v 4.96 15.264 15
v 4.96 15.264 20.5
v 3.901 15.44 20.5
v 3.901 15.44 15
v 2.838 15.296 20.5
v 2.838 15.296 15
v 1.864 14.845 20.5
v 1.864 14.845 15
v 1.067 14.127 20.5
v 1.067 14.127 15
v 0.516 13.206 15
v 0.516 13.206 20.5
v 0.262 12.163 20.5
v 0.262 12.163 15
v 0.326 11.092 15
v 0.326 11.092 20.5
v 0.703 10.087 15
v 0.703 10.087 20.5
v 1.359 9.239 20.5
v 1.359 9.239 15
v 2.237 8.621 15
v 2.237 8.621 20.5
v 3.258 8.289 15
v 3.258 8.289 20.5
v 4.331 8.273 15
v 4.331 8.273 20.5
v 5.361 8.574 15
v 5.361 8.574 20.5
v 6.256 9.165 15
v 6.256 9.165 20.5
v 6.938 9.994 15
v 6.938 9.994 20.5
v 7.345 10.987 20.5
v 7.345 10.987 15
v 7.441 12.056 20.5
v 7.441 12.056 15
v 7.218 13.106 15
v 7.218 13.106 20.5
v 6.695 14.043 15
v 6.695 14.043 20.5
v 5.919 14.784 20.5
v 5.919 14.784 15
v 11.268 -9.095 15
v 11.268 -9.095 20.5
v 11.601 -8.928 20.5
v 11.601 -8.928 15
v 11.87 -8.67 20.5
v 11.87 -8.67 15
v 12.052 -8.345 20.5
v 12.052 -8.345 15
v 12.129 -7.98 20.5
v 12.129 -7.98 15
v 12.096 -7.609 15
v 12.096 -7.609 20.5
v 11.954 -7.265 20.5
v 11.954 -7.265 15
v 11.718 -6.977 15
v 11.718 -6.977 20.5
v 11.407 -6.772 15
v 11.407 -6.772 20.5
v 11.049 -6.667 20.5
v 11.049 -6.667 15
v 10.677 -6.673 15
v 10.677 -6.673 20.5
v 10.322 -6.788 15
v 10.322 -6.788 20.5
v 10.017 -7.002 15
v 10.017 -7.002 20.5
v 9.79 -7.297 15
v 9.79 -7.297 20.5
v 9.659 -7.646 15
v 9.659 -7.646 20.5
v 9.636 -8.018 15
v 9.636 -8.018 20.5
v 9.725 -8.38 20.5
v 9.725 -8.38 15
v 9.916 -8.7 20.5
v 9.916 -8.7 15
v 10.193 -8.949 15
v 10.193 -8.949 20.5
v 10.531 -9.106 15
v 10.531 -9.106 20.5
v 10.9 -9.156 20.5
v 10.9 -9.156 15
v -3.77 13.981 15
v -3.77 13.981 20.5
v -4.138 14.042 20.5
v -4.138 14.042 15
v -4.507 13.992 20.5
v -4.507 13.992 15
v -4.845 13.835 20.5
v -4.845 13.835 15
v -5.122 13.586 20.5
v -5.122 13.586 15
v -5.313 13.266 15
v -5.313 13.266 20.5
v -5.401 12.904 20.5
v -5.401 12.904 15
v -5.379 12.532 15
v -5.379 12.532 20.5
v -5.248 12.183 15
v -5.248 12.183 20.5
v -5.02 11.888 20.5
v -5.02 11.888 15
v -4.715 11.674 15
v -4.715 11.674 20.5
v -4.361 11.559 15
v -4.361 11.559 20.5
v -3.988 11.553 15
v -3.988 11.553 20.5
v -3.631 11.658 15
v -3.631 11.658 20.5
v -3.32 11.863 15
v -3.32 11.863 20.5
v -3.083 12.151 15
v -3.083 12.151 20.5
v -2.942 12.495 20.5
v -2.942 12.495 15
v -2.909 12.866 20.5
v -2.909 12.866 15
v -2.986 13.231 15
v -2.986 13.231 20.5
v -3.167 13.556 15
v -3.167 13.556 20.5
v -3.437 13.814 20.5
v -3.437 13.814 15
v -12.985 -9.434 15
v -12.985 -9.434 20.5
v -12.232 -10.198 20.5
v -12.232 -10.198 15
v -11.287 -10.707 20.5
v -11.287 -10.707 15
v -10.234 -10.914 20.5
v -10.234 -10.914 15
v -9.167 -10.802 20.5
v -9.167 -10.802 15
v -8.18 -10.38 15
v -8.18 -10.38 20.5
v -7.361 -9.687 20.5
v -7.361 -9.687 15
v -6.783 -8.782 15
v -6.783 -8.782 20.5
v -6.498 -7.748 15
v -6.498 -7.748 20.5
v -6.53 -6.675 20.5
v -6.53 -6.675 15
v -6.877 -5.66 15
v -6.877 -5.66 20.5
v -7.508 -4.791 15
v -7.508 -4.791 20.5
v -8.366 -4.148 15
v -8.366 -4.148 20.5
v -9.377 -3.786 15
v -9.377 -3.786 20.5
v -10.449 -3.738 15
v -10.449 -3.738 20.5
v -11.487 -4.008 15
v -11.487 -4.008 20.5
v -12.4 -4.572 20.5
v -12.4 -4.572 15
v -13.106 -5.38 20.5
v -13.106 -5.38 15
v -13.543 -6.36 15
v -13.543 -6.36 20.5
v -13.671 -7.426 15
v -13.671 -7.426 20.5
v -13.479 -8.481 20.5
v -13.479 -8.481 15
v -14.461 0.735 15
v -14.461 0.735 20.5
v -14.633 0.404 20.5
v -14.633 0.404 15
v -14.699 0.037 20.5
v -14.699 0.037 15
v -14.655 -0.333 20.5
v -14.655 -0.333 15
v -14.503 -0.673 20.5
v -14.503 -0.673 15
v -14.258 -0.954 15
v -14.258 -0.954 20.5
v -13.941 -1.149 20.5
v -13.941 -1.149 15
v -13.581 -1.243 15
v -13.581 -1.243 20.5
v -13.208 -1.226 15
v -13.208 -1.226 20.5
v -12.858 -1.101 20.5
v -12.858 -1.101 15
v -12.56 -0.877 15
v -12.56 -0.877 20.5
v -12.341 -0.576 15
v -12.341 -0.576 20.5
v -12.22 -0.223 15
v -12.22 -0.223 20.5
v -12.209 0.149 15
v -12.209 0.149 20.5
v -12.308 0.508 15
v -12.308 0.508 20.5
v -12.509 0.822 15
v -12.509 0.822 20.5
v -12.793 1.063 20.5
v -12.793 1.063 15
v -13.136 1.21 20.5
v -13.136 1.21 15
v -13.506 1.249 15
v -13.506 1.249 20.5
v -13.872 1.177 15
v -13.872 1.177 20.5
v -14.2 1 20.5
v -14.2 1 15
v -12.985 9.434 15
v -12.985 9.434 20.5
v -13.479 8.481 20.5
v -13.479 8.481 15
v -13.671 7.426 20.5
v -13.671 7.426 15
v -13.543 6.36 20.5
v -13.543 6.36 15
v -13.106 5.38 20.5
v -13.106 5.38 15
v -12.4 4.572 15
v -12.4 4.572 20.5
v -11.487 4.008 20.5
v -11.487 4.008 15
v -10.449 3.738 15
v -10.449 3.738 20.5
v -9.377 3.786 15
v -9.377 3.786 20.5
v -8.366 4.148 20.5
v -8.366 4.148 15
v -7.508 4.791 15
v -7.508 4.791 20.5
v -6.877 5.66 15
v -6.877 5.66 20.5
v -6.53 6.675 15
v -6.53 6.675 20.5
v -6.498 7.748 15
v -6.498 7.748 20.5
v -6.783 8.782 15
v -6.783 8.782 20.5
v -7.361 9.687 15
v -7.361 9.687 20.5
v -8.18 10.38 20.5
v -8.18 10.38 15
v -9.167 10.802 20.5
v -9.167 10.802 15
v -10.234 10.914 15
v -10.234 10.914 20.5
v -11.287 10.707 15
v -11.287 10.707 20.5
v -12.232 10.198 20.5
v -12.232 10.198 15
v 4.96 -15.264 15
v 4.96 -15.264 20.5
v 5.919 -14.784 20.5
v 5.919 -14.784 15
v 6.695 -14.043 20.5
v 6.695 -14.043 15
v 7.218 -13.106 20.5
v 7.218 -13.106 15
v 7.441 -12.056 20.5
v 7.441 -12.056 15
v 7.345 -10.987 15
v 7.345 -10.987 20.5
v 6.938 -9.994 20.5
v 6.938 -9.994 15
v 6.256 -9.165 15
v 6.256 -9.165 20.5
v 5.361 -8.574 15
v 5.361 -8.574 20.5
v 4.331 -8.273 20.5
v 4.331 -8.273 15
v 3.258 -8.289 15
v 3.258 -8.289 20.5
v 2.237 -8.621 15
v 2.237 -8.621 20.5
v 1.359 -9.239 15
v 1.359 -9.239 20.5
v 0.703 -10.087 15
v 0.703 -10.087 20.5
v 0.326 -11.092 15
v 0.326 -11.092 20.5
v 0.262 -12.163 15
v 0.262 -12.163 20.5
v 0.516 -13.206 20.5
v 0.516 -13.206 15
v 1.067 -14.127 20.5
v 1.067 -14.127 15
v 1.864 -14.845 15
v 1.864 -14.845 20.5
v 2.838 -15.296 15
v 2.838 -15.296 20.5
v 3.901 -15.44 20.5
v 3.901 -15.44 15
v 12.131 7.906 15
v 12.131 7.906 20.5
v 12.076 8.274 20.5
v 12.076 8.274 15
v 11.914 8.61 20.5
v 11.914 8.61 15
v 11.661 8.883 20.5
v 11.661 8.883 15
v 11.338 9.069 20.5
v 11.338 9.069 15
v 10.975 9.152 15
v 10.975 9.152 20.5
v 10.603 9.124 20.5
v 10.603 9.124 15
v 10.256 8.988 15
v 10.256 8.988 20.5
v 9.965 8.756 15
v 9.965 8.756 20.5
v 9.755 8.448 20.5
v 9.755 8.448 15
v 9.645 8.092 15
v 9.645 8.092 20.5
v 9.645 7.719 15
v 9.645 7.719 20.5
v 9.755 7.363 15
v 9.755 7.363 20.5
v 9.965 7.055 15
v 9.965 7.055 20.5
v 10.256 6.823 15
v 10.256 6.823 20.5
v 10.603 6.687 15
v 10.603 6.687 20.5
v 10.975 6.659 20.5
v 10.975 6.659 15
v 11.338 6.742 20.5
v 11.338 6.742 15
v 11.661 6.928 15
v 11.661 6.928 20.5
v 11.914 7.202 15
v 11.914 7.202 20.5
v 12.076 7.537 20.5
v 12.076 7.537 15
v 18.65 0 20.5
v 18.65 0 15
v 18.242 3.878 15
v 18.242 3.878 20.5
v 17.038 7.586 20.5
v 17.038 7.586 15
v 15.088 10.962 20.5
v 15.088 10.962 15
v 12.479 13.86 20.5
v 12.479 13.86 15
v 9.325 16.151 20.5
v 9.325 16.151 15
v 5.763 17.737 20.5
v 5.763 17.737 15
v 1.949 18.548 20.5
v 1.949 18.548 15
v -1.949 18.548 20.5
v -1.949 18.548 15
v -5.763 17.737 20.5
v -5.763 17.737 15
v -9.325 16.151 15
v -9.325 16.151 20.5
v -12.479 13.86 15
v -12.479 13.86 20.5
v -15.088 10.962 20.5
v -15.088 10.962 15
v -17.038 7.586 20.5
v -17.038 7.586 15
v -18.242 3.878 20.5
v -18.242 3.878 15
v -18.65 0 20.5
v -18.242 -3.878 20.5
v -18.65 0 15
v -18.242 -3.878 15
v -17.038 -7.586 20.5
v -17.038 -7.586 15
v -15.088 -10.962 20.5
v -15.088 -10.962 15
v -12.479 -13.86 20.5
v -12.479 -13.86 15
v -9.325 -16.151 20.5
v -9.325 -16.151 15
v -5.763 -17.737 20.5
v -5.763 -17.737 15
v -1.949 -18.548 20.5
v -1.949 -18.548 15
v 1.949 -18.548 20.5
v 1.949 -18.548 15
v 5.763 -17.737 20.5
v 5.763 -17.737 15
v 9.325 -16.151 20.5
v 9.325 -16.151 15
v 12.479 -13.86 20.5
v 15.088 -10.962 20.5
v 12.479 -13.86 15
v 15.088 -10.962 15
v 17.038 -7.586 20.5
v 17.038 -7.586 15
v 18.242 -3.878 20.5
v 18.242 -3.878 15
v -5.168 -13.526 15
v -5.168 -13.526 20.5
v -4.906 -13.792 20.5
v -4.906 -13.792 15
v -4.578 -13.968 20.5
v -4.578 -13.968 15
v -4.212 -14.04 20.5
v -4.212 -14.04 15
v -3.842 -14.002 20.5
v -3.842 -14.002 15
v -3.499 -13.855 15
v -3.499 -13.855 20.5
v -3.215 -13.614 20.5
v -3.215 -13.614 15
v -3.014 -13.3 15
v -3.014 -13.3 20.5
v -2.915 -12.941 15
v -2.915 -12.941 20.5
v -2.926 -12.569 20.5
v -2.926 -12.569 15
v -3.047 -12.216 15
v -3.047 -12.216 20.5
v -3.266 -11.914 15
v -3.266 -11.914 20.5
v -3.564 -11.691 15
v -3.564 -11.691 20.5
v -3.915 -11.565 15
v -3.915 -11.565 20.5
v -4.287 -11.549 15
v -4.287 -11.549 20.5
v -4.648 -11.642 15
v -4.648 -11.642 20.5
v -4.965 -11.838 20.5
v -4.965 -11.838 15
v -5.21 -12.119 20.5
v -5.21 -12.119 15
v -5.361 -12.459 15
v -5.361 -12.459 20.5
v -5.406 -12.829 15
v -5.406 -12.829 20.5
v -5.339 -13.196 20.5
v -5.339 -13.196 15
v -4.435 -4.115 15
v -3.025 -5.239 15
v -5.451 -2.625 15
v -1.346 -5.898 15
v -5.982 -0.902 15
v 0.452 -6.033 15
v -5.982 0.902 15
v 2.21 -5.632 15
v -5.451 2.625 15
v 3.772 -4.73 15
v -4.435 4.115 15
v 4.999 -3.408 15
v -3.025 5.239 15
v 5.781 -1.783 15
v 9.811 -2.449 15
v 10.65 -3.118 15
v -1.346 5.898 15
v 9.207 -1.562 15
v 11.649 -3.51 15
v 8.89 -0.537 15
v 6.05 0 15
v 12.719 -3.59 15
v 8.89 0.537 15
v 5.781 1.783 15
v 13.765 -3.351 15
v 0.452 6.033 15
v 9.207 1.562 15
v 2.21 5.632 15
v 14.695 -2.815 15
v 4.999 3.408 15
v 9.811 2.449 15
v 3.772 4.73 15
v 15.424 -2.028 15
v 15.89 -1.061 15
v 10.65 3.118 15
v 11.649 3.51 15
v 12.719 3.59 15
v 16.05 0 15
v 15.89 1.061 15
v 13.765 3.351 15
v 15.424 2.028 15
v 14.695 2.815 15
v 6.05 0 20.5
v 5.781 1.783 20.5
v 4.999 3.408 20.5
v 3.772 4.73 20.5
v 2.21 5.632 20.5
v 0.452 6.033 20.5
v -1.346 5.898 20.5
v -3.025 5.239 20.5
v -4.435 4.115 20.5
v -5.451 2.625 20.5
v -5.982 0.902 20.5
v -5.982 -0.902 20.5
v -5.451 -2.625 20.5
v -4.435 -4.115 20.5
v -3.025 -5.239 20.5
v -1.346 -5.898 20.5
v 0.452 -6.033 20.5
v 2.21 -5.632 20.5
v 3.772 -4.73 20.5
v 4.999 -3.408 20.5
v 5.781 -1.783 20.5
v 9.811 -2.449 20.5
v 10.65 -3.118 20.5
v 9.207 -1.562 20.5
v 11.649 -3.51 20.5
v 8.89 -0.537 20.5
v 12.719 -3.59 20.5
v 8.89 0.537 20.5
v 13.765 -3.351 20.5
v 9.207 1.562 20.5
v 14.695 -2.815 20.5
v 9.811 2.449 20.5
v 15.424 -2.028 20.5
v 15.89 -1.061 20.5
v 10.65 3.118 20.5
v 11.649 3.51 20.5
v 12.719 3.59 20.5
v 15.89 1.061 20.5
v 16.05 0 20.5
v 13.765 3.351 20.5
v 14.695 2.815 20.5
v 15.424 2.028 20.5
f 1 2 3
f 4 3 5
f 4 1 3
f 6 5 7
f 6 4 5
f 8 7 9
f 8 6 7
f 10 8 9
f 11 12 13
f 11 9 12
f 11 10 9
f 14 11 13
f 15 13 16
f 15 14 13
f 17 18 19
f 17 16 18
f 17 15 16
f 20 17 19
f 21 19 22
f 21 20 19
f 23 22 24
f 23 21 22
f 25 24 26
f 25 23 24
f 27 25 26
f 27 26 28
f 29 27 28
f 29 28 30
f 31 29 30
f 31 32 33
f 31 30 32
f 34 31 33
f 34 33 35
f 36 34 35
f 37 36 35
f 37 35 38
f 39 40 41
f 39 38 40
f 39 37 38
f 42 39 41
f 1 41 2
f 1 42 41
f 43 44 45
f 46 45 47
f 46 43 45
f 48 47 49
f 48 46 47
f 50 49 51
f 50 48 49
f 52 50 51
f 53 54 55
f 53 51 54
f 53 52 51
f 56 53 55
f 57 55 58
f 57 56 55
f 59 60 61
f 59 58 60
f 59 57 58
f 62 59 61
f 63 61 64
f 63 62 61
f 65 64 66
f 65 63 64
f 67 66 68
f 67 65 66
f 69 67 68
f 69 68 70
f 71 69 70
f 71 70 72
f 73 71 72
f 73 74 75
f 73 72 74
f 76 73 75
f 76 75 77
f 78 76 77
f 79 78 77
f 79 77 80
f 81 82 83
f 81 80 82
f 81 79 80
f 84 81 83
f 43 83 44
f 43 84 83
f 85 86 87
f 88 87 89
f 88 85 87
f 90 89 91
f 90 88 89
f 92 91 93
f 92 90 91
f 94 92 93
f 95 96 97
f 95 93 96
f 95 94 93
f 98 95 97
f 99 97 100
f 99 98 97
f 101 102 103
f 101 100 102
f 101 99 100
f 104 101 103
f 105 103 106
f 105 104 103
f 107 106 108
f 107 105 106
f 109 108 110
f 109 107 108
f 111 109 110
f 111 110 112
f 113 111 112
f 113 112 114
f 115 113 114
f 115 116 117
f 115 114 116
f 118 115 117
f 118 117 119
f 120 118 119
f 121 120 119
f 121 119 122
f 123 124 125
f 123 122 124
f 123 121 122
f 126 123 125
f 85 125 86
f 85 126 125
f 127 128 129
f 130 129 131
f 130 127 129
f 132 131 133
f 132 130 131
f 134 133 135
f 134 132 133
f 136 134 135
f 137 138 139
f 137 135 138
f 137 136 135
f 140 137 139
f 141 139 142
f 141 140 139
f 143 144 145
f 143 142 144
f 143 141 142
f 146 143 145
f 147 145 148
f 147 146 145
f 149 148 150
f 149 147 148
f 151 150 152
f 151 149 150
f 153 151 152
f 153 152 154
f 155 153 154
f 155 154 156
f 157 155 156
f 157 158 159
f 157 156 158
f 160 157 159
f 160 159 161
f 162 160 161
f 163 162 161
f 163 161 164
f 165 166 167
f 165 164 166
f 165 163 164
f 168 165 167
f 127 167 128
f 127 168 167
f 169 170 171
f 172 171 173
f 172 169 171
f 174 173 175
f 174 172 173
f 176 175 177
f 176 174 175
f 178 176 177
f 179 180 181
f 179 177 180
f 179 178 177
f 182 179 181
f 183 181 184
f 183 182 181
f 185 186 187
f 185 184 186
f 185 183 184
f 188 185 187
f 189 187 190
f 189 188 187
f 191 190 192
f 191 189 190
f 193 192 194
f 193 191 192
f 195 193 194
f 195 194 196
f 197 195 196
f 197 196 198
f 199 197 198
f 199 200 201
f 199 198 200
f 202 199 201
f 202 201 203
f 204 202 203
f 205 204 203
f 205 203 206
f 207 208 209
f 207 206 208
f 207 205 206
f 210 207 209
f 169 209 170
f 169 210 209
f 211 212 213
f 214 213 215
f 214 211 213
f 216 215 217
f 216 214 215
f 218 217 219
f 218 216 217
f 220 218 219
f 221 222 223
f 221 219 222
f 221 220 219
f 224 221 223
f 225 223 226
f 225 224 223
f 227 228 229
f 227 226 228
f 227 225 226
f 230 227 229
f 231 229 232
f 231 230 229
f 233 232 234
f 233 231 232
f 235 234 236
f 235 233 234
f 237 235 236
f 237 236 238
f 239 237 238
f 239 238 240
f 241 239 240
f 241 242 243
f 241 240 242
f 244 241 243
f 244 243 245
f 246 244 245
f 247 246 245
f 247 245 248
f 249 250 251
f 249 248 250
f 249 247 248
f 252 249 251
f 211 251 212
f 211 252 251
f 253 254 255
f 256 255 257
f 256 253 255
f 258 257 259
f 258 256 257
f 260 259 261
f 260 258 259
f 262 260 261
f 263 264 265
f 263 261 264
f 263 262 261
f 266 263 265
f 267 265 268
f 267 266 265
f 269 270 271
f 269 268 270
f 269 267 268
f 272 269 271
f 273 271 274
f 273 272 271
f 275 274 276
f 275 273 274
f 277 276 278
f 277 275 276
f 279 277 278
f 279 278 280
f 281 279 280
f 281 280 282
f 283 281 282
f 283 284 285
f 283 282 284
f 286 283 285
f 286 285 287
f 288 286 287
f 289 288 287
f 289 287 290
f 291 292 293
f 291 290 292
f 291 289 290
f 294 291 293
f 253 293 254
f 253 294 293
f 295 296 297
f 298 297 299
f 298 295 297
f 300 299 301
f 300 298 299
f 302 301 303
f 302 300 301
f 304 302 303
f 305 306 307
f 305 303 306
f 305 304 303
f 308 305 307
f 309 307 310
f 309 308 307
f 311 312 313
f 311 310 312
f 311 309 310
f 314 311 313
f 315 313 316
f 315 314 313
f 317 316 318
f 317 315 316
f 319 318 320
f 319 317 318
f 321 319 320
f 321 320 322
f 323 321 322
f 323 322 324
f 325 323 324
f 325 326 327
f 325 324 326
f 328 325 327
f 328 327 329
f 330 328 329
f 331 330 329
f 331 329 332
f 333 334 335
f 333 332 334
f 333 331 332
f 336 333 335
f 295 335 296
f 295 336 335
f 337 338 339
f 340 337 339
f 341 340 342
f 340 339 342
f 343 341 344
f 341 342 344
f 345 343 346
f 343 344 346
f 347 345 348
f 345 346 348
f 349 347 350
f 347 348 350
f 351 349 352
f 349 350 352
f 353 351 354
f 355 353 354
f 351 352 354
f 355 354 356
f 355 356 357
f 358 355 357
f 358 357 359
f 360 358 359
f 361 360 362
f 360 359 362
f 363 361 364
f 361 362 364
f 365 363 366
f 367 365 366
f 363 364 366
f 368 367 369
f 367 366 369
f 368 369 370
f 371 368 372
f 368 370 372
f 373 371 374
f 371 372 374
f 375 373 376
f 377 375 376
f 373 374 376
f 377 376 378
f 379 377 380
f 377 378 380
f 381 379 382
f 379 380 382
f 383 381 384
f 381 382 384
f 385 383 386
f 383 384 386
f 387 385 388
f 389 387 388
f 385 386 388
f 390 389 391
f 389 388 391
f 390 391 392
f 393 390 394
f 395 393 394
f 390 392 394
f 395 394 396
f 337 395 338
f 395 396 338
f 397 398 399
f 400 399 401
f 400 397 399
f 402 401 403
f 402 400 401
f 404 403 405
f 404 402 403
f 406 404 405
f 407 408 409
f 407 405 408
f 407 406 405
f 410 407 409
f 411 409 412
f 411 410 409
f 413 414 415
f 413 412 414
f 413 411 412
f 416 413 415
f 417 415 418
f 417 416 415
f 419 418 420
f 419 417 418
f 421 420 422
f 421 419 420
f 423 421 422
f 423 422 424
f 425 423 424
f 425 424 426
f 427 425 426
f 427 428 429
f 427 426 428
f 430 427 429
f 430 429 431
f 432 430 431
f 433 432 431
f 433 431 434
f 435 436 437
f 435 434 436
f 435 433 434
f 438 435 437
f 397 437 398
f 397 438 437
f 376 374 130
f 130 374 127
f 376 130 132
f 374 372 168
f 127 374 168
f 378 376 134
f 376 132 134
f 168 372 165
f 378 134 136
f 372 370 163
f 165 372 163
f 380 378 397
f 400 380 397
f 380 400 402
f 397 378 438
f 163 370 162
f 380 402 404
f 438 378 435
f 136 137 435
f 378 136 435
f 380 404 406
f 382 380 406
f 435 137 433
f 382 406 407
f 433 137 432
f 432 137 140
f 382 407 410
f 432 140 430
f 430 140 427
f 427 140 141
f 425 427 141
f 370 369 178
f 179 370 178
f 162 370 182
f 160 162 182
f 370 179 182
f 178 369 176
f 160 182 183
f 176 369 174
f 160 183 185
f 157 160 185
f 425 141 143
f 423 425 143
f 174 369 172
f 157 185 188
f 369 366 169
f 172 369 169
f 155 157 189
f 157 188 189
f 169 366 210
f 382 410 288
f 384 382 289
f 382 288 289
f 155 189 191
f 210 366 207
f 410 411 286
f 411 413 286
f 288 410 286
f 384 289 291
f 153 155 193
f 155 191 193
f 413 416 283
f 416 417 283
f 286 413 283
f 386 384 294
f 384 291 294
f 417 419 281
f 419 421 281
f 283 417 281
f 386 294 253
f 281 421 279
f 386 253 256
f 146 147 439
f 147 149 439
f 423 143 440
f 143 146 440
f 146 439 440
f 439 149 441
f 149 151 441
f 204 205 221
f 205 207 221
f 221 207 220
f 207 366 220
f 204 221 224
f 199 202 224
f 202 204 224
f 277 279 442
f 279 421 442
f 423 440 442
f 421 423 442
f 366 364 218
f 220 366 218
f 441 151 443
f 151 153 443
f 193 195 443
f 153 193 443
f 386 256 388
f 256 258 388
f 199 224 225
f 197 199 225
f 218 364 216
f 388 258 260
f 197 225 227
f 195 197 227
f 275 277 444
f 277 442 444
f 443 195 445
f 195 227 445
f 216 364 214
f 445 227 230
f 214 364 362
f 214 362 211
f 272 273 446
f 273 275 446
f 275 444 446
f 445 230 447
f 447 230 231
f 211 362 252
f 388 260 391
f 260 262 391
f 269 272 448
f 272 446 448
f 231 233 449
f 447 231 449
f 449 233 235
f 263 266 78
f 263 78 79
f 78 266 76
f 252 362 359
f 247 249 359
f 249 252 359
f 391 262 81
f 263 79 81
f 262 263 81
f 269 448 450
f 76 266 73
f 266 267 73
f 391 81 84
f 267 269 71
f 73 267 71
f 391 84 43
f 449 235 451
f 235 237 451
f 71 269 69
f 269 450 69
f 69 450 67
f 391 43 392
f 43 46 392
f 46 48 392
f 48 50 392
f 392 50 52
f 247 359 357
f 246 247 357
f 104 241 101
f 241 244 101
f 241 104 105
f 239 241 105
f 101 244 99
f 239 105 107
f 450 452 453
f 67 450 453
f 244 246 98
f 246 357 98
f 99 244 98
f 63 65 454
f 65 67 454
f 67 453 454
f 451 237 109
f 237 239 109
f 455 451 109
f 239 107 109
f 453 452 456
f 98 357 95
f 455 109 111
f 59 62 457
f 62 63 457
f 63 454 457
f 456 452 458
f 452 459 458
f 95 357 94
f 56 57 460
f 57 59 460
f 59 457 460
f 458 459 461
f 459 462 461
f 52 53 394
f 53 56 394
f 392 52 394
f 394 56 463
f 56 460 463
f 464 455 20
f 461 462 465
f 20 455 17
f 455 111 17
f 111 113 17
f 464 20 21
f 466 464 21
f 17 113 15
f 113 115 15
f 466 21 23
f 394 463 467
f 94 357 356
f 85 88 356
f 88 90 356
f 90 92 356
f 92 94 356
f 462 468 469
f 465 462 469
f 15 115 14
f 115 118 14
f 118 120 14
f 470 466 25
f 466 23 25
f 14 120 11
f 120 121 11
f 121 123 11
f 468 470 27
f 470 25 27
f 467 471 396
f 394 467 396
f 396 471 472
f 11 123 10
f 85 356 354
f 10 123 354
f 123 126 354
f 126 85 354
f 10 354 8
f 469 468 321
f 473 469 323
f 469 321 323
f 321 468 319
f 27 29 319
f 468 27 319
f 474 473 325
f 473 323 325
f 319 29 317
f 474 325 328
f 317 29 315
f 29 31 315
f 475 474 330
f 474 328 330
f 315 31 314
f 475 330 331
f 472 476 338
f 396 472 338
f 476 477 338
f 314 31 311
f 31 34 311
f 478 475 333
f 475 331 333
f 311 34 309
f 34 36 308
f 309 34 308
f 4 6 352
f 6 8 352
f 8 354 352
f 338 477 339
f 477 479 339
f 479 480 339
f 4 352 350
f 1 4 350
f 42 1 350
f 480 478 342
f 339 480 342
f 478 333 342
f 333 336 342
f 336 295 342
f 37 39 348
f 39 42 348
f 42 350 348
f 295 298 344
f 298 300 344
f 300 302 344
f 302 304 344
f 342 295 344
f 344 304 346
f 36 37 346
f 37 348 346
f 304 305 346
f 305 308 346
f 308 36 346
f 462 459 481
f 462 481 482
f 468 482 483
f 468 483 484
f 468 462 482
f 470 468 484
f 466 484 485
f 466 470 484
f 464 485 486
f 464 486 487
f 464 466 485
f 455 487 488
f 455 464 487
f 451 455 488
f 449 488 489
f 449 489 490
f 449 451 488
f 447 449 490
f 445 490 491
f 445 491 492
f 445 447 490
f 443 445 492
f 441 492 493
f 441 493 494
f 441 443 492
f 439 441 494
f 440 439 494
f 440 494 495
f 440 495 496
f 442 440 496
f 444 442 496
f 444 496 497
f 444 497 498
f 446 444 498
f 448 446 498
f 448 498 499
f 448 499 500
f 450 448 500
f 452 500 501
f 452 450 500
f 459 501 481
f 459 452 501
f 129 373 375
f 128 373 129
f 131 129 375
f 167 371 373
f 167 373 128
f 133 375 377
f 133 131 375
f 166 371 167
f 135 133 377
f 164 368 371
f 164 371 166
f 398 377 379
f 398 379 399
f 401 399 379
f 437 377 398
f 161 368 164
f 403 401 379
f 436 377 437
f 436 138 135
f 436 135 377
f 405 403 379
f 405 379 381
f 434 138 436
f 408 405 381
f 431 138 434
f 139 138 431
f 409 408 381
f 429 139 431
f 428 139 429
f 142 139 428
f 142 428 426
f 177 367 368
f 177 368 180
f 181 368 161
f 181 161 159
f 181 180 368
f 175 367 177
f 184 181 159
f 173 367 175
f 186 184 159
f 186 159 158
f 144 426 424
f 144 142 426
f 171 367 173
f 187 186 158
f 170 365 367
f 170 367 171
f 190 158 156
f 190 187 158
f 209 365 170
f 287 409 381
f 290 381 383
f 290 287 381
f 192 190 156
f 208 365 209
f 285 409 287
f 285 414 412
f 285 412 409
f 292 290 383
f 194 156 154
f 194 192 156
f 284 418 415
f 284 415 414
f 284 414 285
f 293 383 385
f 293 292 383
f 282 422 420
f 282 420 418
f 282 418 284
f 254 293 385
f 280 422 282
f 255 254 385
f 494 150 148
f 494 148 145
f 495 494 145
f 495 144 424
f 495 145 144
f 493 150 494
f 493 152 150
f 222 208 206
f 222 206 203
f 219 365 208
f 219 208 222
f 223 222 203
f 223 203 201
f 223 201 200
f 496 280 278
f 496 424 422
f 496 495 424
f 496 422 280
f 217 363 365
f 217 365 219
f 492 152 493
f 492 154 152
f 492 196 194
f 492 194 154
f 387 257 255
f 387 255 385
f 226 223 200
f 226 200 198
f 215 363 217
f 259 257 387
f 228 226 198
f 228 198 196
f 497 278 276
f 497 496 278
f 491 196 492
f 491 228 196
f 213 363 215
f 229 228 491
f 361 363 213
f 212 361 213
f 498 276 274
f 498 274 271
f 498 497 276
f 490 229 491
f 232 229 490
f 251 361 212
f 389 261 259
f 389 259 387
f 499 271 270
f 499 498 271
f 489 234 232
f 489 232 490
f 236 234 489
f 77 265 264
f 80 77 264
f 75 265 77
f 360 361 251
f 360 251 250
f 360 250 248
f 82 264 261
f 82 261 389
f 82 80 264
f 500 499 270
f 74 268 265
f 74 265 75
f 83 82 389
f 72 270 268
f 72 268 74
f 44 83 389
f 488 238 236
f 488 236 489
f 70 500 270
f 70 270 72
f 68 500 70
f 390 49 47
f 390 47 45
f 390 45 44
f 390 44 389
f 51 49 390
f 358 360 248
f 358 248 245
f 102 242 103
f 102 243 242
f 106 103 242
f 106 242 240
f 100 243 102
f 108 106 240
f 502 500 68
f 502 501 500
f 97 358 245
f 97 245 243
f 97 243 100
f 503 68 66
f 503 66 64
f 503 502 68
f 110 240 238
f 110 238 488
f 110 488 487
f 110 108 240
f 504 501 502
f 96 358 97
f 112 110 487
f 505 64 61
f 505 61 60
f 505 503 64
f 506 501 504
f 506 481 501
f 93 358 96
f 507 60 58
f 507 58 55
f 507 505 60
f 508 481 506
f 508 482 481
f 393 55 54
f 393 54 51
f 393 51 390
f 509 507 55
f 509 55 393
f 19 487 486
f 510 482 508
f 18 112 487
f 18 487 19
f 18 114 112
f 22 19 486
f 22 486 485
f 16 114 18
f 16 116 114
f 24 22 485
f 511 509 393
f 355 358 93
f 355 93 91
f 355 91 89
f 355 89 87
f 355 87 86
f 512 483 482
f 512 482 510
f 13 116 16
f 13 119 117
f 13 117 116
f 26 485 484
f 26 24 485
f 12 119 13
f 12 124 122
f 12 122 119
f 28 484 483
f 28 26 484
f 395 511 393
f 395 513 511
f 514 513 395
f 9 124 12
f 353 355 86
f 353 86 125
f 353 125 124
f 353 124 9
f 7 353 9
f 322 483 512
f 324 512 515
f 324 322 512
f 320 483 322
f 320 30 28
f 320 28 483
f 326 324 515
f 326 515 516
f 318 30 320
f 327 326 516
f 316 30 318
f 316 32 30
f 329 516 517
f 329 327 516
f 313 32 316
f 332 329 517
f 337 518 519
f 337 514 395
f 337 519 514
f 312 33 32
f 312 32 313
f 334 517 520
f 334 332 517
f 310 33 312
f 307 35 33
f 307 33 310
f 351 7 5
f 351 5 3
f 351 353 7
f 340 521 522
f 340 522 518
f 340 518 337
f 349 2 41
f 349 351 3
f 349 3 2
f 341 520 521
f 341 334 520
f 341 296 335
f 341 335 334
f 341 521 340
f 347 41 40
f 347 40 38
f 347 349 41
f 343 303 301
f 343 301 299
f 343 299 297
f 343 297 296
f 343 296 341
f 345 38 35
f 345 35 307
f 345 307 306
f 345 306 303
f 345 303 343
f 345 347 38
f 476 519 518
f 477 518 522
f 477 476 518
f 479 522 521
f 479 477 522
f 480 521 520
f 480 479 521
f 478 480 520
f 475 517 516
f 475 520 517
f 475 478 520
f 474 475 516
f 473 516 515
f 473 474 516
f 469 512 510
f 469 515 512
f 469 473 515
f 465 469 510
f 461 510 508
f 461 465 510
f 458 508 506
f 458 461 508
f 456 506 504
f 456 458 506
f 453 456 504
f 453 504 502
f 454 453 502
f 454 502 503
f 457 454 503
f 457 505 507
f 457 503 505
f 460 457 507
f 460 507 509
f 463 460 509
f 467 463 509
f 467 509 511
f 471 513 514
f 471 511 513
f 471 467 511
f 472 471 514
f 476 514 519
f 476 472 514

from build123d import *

# Parameters (mm, degrees)
SKETCH038_R           = 18.65
SKETCH038_R_2         = 6.05
PAD010_DEPTH          = 5.5
SKETCH039_R           = 3.6
SKETCH039_R_2         = 1.25
POCKET008_DEPTH       = 111.57324
POLARPATTERN001_COUNT = 5


with BuildPart() as part:
    # Sketch038 → Pad010 (new body)
    with BuildSketch(Plane.XY):
        Circle(SKETCH038_R)
        Circle(SKETCH038_R_2, mode=Mode.SUBTRACT)
    extrude(amount=PAD010_DEPTH)

    # Sketch039 → Pocket008 (cut, through all)
    with BuildSketch(Plane.XY):
        with Locations((12.45, 0)):
            Circle(SKETCH039_R)
        with Locations((10.881279, 7.905712)):
            Circle(SKETCH039_R_2)
    pocket008 = extrude(amount=POCKET008_DEPTH, mode=Mode.SUBTRACT)

    # PolarPattern001: Pocket008 ×5 about axis
    polarpattern001_axis = Axis((0, 0, 0), (0, 0, 1))
    for i in range(1, POLARPATTERN001_COUNT):
        add(pocket008.rotate(polarpattern001_axis, i * 360 / POLARPATTERN001_COUNT), mode=Mode.SUBTRACT)


with BuildPart() as part_1:
    # Body009 placement: moved
    add(part.part.moved(Location((0, 0, 15))))


solid = part_1.part
